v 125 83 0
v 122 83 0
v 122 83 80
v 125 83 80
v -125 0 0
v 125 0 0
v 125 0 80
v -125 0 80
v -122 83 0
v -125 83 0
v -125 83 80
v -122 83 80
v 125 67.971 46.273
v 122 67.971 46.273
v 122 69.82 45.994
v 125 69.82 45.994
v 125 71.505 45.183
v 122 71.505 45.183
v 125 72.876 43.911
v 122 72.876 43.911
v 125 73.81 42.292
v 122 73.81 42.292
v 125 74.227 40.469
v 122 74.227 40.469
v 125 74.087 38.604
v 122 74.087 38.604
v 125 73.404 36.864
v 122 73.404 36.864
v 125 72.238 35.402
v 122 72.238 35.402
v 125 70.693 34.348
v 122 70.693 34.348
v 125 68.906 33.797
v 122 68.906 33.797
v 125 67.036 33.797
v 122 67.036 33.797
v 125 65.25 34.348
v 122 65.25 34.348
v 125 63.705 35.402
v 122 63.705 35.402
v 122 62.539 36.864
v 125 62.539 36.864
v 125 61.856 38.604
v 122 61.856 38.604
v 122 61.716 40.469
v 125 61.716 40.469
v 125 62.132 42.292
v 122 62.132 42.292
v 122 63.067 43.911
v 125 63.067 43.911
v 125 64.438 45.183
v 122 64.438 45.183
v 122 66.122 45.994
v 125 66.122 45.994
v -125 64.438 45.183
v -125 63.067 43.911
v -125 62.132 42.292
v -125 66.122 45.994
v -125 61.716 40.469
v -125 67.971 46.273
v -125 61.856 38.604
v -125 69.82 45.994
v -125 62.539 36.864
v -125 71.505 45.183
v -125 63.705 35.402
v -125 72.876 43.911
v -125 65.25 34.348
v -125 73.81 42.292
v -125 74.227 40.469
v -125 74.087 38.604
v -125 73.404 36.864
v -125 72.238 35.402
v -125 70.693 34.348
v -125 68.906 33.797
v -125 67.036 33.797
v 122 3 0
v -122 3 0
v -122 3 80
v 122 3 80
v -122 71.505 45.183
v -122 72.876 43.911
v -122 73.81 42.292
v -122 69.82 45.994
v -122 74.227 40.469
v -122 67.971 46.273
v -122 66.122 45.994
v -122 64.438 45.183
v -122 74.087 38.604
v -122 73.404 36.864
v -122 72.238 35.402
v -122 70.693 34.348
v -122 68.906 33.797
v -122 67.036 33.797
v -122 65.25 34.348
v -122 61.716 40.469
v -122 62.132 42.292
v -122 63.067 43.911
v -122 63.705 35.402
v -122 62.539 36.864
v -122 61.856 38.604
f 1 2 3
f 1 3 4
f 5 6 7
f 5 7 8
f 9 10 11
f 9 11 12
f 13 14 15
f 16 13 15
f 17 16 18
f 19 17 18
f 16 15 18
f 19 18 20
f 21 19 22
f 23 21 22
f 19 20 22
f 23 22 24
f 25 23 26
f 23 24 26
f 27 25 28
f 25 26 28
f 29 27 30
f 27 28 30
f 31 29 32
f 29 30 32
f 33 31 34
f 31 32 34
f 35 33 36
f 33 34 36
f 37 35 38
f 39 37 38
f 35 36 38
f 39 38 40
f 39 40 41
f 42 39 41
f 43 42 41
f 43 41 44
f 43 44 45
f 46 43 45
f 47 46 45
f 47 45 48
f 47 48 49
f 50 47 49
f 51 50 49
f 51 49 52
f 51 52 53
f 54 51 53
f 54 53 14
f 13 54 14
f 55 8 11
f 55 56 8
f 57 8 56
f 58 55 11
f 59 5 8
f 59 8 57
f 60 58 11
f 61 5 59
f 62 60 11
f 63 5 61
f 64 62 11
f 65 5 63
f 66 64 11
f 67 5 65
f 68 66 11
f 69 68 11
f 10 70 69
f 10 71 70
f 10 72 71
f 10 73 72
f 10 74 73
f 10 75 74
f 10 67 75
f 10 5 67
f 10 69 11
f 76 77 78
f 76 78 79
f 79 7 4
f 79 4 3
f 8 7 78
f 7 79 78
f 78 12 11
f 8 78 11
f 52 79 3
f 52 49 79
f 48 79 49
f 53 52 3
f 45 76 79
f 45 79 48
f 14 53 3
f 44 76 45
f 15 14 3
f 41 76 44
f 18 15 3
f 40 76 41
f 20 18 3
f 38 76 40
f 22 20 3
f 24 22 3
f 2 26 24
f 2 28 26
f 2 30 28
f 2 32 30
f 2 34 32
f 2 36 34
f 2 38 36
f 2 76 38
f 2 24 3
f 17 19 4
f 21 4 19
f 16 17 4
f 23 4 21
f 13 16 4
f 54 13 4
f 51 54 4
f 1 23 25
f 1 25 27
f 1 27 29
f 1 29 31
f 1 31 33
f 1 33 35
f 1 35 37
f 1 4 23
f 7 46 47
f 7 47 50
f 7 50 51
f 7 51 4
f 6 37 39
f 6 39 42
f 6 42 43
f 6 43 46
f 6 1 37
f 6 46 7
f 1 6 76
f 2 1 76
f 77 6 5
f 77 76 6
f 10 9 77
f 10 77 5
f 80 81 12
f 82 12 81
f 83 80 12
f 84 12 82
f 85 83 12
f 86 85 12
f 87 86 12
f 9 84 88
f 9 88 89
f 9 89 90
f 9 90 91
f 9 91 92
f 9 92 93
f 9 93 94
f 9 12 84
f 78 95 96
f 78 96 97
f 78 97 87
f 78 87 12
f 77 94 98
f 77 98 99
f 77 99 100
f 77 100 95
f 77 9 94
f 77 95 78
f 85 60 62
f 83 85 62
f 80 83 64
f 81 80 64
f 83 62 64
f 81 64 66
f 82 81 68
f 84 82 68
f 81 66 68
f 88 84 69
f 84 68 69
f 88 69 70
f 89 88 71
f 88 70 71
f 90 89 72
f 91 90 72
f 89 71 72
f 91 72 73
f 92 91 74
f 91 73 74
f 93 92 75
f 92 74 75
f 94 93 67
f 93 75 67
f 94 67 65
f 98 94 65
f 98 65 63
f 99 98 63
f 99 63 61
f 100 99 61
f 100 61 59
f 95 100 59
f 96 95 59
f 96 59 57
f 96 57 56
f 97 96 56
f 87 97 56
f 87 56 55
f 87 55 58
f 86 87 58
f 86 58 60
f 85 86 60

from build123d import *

# Parameters (mm, degrees)
BOSS_EXTRUDE1_DEPTH = 80
SKETCH2_R           = 6.272806616
CUT_EXTRUDE1_DEPTH  = 500


with BuildPart() as part:
    # Sketch1 → Boss-Extrude1 (new body)
    with BuildSketch(Plane.XY):
        Polygon((125, 0), (-125, 0), (-125, 83), (-122, 83), (-122, 3), (122, 3), (122, 83), (125, 83), align=None)
    extrude(amount=BOSS_EXTRUDE1_DEPTH)

    # Sketch2 → Cut-Extrude1 (cut)
    with BuildSketch(Plane.ZY.offset(125)):
        with Locations((40, 67.971243919)):
            Circle(SKETCH2_R)
    extrude(amount=-CUT_EXTRUDE1_DEPTH, mode=Mode.SUBTRACT)


solid = part.part
